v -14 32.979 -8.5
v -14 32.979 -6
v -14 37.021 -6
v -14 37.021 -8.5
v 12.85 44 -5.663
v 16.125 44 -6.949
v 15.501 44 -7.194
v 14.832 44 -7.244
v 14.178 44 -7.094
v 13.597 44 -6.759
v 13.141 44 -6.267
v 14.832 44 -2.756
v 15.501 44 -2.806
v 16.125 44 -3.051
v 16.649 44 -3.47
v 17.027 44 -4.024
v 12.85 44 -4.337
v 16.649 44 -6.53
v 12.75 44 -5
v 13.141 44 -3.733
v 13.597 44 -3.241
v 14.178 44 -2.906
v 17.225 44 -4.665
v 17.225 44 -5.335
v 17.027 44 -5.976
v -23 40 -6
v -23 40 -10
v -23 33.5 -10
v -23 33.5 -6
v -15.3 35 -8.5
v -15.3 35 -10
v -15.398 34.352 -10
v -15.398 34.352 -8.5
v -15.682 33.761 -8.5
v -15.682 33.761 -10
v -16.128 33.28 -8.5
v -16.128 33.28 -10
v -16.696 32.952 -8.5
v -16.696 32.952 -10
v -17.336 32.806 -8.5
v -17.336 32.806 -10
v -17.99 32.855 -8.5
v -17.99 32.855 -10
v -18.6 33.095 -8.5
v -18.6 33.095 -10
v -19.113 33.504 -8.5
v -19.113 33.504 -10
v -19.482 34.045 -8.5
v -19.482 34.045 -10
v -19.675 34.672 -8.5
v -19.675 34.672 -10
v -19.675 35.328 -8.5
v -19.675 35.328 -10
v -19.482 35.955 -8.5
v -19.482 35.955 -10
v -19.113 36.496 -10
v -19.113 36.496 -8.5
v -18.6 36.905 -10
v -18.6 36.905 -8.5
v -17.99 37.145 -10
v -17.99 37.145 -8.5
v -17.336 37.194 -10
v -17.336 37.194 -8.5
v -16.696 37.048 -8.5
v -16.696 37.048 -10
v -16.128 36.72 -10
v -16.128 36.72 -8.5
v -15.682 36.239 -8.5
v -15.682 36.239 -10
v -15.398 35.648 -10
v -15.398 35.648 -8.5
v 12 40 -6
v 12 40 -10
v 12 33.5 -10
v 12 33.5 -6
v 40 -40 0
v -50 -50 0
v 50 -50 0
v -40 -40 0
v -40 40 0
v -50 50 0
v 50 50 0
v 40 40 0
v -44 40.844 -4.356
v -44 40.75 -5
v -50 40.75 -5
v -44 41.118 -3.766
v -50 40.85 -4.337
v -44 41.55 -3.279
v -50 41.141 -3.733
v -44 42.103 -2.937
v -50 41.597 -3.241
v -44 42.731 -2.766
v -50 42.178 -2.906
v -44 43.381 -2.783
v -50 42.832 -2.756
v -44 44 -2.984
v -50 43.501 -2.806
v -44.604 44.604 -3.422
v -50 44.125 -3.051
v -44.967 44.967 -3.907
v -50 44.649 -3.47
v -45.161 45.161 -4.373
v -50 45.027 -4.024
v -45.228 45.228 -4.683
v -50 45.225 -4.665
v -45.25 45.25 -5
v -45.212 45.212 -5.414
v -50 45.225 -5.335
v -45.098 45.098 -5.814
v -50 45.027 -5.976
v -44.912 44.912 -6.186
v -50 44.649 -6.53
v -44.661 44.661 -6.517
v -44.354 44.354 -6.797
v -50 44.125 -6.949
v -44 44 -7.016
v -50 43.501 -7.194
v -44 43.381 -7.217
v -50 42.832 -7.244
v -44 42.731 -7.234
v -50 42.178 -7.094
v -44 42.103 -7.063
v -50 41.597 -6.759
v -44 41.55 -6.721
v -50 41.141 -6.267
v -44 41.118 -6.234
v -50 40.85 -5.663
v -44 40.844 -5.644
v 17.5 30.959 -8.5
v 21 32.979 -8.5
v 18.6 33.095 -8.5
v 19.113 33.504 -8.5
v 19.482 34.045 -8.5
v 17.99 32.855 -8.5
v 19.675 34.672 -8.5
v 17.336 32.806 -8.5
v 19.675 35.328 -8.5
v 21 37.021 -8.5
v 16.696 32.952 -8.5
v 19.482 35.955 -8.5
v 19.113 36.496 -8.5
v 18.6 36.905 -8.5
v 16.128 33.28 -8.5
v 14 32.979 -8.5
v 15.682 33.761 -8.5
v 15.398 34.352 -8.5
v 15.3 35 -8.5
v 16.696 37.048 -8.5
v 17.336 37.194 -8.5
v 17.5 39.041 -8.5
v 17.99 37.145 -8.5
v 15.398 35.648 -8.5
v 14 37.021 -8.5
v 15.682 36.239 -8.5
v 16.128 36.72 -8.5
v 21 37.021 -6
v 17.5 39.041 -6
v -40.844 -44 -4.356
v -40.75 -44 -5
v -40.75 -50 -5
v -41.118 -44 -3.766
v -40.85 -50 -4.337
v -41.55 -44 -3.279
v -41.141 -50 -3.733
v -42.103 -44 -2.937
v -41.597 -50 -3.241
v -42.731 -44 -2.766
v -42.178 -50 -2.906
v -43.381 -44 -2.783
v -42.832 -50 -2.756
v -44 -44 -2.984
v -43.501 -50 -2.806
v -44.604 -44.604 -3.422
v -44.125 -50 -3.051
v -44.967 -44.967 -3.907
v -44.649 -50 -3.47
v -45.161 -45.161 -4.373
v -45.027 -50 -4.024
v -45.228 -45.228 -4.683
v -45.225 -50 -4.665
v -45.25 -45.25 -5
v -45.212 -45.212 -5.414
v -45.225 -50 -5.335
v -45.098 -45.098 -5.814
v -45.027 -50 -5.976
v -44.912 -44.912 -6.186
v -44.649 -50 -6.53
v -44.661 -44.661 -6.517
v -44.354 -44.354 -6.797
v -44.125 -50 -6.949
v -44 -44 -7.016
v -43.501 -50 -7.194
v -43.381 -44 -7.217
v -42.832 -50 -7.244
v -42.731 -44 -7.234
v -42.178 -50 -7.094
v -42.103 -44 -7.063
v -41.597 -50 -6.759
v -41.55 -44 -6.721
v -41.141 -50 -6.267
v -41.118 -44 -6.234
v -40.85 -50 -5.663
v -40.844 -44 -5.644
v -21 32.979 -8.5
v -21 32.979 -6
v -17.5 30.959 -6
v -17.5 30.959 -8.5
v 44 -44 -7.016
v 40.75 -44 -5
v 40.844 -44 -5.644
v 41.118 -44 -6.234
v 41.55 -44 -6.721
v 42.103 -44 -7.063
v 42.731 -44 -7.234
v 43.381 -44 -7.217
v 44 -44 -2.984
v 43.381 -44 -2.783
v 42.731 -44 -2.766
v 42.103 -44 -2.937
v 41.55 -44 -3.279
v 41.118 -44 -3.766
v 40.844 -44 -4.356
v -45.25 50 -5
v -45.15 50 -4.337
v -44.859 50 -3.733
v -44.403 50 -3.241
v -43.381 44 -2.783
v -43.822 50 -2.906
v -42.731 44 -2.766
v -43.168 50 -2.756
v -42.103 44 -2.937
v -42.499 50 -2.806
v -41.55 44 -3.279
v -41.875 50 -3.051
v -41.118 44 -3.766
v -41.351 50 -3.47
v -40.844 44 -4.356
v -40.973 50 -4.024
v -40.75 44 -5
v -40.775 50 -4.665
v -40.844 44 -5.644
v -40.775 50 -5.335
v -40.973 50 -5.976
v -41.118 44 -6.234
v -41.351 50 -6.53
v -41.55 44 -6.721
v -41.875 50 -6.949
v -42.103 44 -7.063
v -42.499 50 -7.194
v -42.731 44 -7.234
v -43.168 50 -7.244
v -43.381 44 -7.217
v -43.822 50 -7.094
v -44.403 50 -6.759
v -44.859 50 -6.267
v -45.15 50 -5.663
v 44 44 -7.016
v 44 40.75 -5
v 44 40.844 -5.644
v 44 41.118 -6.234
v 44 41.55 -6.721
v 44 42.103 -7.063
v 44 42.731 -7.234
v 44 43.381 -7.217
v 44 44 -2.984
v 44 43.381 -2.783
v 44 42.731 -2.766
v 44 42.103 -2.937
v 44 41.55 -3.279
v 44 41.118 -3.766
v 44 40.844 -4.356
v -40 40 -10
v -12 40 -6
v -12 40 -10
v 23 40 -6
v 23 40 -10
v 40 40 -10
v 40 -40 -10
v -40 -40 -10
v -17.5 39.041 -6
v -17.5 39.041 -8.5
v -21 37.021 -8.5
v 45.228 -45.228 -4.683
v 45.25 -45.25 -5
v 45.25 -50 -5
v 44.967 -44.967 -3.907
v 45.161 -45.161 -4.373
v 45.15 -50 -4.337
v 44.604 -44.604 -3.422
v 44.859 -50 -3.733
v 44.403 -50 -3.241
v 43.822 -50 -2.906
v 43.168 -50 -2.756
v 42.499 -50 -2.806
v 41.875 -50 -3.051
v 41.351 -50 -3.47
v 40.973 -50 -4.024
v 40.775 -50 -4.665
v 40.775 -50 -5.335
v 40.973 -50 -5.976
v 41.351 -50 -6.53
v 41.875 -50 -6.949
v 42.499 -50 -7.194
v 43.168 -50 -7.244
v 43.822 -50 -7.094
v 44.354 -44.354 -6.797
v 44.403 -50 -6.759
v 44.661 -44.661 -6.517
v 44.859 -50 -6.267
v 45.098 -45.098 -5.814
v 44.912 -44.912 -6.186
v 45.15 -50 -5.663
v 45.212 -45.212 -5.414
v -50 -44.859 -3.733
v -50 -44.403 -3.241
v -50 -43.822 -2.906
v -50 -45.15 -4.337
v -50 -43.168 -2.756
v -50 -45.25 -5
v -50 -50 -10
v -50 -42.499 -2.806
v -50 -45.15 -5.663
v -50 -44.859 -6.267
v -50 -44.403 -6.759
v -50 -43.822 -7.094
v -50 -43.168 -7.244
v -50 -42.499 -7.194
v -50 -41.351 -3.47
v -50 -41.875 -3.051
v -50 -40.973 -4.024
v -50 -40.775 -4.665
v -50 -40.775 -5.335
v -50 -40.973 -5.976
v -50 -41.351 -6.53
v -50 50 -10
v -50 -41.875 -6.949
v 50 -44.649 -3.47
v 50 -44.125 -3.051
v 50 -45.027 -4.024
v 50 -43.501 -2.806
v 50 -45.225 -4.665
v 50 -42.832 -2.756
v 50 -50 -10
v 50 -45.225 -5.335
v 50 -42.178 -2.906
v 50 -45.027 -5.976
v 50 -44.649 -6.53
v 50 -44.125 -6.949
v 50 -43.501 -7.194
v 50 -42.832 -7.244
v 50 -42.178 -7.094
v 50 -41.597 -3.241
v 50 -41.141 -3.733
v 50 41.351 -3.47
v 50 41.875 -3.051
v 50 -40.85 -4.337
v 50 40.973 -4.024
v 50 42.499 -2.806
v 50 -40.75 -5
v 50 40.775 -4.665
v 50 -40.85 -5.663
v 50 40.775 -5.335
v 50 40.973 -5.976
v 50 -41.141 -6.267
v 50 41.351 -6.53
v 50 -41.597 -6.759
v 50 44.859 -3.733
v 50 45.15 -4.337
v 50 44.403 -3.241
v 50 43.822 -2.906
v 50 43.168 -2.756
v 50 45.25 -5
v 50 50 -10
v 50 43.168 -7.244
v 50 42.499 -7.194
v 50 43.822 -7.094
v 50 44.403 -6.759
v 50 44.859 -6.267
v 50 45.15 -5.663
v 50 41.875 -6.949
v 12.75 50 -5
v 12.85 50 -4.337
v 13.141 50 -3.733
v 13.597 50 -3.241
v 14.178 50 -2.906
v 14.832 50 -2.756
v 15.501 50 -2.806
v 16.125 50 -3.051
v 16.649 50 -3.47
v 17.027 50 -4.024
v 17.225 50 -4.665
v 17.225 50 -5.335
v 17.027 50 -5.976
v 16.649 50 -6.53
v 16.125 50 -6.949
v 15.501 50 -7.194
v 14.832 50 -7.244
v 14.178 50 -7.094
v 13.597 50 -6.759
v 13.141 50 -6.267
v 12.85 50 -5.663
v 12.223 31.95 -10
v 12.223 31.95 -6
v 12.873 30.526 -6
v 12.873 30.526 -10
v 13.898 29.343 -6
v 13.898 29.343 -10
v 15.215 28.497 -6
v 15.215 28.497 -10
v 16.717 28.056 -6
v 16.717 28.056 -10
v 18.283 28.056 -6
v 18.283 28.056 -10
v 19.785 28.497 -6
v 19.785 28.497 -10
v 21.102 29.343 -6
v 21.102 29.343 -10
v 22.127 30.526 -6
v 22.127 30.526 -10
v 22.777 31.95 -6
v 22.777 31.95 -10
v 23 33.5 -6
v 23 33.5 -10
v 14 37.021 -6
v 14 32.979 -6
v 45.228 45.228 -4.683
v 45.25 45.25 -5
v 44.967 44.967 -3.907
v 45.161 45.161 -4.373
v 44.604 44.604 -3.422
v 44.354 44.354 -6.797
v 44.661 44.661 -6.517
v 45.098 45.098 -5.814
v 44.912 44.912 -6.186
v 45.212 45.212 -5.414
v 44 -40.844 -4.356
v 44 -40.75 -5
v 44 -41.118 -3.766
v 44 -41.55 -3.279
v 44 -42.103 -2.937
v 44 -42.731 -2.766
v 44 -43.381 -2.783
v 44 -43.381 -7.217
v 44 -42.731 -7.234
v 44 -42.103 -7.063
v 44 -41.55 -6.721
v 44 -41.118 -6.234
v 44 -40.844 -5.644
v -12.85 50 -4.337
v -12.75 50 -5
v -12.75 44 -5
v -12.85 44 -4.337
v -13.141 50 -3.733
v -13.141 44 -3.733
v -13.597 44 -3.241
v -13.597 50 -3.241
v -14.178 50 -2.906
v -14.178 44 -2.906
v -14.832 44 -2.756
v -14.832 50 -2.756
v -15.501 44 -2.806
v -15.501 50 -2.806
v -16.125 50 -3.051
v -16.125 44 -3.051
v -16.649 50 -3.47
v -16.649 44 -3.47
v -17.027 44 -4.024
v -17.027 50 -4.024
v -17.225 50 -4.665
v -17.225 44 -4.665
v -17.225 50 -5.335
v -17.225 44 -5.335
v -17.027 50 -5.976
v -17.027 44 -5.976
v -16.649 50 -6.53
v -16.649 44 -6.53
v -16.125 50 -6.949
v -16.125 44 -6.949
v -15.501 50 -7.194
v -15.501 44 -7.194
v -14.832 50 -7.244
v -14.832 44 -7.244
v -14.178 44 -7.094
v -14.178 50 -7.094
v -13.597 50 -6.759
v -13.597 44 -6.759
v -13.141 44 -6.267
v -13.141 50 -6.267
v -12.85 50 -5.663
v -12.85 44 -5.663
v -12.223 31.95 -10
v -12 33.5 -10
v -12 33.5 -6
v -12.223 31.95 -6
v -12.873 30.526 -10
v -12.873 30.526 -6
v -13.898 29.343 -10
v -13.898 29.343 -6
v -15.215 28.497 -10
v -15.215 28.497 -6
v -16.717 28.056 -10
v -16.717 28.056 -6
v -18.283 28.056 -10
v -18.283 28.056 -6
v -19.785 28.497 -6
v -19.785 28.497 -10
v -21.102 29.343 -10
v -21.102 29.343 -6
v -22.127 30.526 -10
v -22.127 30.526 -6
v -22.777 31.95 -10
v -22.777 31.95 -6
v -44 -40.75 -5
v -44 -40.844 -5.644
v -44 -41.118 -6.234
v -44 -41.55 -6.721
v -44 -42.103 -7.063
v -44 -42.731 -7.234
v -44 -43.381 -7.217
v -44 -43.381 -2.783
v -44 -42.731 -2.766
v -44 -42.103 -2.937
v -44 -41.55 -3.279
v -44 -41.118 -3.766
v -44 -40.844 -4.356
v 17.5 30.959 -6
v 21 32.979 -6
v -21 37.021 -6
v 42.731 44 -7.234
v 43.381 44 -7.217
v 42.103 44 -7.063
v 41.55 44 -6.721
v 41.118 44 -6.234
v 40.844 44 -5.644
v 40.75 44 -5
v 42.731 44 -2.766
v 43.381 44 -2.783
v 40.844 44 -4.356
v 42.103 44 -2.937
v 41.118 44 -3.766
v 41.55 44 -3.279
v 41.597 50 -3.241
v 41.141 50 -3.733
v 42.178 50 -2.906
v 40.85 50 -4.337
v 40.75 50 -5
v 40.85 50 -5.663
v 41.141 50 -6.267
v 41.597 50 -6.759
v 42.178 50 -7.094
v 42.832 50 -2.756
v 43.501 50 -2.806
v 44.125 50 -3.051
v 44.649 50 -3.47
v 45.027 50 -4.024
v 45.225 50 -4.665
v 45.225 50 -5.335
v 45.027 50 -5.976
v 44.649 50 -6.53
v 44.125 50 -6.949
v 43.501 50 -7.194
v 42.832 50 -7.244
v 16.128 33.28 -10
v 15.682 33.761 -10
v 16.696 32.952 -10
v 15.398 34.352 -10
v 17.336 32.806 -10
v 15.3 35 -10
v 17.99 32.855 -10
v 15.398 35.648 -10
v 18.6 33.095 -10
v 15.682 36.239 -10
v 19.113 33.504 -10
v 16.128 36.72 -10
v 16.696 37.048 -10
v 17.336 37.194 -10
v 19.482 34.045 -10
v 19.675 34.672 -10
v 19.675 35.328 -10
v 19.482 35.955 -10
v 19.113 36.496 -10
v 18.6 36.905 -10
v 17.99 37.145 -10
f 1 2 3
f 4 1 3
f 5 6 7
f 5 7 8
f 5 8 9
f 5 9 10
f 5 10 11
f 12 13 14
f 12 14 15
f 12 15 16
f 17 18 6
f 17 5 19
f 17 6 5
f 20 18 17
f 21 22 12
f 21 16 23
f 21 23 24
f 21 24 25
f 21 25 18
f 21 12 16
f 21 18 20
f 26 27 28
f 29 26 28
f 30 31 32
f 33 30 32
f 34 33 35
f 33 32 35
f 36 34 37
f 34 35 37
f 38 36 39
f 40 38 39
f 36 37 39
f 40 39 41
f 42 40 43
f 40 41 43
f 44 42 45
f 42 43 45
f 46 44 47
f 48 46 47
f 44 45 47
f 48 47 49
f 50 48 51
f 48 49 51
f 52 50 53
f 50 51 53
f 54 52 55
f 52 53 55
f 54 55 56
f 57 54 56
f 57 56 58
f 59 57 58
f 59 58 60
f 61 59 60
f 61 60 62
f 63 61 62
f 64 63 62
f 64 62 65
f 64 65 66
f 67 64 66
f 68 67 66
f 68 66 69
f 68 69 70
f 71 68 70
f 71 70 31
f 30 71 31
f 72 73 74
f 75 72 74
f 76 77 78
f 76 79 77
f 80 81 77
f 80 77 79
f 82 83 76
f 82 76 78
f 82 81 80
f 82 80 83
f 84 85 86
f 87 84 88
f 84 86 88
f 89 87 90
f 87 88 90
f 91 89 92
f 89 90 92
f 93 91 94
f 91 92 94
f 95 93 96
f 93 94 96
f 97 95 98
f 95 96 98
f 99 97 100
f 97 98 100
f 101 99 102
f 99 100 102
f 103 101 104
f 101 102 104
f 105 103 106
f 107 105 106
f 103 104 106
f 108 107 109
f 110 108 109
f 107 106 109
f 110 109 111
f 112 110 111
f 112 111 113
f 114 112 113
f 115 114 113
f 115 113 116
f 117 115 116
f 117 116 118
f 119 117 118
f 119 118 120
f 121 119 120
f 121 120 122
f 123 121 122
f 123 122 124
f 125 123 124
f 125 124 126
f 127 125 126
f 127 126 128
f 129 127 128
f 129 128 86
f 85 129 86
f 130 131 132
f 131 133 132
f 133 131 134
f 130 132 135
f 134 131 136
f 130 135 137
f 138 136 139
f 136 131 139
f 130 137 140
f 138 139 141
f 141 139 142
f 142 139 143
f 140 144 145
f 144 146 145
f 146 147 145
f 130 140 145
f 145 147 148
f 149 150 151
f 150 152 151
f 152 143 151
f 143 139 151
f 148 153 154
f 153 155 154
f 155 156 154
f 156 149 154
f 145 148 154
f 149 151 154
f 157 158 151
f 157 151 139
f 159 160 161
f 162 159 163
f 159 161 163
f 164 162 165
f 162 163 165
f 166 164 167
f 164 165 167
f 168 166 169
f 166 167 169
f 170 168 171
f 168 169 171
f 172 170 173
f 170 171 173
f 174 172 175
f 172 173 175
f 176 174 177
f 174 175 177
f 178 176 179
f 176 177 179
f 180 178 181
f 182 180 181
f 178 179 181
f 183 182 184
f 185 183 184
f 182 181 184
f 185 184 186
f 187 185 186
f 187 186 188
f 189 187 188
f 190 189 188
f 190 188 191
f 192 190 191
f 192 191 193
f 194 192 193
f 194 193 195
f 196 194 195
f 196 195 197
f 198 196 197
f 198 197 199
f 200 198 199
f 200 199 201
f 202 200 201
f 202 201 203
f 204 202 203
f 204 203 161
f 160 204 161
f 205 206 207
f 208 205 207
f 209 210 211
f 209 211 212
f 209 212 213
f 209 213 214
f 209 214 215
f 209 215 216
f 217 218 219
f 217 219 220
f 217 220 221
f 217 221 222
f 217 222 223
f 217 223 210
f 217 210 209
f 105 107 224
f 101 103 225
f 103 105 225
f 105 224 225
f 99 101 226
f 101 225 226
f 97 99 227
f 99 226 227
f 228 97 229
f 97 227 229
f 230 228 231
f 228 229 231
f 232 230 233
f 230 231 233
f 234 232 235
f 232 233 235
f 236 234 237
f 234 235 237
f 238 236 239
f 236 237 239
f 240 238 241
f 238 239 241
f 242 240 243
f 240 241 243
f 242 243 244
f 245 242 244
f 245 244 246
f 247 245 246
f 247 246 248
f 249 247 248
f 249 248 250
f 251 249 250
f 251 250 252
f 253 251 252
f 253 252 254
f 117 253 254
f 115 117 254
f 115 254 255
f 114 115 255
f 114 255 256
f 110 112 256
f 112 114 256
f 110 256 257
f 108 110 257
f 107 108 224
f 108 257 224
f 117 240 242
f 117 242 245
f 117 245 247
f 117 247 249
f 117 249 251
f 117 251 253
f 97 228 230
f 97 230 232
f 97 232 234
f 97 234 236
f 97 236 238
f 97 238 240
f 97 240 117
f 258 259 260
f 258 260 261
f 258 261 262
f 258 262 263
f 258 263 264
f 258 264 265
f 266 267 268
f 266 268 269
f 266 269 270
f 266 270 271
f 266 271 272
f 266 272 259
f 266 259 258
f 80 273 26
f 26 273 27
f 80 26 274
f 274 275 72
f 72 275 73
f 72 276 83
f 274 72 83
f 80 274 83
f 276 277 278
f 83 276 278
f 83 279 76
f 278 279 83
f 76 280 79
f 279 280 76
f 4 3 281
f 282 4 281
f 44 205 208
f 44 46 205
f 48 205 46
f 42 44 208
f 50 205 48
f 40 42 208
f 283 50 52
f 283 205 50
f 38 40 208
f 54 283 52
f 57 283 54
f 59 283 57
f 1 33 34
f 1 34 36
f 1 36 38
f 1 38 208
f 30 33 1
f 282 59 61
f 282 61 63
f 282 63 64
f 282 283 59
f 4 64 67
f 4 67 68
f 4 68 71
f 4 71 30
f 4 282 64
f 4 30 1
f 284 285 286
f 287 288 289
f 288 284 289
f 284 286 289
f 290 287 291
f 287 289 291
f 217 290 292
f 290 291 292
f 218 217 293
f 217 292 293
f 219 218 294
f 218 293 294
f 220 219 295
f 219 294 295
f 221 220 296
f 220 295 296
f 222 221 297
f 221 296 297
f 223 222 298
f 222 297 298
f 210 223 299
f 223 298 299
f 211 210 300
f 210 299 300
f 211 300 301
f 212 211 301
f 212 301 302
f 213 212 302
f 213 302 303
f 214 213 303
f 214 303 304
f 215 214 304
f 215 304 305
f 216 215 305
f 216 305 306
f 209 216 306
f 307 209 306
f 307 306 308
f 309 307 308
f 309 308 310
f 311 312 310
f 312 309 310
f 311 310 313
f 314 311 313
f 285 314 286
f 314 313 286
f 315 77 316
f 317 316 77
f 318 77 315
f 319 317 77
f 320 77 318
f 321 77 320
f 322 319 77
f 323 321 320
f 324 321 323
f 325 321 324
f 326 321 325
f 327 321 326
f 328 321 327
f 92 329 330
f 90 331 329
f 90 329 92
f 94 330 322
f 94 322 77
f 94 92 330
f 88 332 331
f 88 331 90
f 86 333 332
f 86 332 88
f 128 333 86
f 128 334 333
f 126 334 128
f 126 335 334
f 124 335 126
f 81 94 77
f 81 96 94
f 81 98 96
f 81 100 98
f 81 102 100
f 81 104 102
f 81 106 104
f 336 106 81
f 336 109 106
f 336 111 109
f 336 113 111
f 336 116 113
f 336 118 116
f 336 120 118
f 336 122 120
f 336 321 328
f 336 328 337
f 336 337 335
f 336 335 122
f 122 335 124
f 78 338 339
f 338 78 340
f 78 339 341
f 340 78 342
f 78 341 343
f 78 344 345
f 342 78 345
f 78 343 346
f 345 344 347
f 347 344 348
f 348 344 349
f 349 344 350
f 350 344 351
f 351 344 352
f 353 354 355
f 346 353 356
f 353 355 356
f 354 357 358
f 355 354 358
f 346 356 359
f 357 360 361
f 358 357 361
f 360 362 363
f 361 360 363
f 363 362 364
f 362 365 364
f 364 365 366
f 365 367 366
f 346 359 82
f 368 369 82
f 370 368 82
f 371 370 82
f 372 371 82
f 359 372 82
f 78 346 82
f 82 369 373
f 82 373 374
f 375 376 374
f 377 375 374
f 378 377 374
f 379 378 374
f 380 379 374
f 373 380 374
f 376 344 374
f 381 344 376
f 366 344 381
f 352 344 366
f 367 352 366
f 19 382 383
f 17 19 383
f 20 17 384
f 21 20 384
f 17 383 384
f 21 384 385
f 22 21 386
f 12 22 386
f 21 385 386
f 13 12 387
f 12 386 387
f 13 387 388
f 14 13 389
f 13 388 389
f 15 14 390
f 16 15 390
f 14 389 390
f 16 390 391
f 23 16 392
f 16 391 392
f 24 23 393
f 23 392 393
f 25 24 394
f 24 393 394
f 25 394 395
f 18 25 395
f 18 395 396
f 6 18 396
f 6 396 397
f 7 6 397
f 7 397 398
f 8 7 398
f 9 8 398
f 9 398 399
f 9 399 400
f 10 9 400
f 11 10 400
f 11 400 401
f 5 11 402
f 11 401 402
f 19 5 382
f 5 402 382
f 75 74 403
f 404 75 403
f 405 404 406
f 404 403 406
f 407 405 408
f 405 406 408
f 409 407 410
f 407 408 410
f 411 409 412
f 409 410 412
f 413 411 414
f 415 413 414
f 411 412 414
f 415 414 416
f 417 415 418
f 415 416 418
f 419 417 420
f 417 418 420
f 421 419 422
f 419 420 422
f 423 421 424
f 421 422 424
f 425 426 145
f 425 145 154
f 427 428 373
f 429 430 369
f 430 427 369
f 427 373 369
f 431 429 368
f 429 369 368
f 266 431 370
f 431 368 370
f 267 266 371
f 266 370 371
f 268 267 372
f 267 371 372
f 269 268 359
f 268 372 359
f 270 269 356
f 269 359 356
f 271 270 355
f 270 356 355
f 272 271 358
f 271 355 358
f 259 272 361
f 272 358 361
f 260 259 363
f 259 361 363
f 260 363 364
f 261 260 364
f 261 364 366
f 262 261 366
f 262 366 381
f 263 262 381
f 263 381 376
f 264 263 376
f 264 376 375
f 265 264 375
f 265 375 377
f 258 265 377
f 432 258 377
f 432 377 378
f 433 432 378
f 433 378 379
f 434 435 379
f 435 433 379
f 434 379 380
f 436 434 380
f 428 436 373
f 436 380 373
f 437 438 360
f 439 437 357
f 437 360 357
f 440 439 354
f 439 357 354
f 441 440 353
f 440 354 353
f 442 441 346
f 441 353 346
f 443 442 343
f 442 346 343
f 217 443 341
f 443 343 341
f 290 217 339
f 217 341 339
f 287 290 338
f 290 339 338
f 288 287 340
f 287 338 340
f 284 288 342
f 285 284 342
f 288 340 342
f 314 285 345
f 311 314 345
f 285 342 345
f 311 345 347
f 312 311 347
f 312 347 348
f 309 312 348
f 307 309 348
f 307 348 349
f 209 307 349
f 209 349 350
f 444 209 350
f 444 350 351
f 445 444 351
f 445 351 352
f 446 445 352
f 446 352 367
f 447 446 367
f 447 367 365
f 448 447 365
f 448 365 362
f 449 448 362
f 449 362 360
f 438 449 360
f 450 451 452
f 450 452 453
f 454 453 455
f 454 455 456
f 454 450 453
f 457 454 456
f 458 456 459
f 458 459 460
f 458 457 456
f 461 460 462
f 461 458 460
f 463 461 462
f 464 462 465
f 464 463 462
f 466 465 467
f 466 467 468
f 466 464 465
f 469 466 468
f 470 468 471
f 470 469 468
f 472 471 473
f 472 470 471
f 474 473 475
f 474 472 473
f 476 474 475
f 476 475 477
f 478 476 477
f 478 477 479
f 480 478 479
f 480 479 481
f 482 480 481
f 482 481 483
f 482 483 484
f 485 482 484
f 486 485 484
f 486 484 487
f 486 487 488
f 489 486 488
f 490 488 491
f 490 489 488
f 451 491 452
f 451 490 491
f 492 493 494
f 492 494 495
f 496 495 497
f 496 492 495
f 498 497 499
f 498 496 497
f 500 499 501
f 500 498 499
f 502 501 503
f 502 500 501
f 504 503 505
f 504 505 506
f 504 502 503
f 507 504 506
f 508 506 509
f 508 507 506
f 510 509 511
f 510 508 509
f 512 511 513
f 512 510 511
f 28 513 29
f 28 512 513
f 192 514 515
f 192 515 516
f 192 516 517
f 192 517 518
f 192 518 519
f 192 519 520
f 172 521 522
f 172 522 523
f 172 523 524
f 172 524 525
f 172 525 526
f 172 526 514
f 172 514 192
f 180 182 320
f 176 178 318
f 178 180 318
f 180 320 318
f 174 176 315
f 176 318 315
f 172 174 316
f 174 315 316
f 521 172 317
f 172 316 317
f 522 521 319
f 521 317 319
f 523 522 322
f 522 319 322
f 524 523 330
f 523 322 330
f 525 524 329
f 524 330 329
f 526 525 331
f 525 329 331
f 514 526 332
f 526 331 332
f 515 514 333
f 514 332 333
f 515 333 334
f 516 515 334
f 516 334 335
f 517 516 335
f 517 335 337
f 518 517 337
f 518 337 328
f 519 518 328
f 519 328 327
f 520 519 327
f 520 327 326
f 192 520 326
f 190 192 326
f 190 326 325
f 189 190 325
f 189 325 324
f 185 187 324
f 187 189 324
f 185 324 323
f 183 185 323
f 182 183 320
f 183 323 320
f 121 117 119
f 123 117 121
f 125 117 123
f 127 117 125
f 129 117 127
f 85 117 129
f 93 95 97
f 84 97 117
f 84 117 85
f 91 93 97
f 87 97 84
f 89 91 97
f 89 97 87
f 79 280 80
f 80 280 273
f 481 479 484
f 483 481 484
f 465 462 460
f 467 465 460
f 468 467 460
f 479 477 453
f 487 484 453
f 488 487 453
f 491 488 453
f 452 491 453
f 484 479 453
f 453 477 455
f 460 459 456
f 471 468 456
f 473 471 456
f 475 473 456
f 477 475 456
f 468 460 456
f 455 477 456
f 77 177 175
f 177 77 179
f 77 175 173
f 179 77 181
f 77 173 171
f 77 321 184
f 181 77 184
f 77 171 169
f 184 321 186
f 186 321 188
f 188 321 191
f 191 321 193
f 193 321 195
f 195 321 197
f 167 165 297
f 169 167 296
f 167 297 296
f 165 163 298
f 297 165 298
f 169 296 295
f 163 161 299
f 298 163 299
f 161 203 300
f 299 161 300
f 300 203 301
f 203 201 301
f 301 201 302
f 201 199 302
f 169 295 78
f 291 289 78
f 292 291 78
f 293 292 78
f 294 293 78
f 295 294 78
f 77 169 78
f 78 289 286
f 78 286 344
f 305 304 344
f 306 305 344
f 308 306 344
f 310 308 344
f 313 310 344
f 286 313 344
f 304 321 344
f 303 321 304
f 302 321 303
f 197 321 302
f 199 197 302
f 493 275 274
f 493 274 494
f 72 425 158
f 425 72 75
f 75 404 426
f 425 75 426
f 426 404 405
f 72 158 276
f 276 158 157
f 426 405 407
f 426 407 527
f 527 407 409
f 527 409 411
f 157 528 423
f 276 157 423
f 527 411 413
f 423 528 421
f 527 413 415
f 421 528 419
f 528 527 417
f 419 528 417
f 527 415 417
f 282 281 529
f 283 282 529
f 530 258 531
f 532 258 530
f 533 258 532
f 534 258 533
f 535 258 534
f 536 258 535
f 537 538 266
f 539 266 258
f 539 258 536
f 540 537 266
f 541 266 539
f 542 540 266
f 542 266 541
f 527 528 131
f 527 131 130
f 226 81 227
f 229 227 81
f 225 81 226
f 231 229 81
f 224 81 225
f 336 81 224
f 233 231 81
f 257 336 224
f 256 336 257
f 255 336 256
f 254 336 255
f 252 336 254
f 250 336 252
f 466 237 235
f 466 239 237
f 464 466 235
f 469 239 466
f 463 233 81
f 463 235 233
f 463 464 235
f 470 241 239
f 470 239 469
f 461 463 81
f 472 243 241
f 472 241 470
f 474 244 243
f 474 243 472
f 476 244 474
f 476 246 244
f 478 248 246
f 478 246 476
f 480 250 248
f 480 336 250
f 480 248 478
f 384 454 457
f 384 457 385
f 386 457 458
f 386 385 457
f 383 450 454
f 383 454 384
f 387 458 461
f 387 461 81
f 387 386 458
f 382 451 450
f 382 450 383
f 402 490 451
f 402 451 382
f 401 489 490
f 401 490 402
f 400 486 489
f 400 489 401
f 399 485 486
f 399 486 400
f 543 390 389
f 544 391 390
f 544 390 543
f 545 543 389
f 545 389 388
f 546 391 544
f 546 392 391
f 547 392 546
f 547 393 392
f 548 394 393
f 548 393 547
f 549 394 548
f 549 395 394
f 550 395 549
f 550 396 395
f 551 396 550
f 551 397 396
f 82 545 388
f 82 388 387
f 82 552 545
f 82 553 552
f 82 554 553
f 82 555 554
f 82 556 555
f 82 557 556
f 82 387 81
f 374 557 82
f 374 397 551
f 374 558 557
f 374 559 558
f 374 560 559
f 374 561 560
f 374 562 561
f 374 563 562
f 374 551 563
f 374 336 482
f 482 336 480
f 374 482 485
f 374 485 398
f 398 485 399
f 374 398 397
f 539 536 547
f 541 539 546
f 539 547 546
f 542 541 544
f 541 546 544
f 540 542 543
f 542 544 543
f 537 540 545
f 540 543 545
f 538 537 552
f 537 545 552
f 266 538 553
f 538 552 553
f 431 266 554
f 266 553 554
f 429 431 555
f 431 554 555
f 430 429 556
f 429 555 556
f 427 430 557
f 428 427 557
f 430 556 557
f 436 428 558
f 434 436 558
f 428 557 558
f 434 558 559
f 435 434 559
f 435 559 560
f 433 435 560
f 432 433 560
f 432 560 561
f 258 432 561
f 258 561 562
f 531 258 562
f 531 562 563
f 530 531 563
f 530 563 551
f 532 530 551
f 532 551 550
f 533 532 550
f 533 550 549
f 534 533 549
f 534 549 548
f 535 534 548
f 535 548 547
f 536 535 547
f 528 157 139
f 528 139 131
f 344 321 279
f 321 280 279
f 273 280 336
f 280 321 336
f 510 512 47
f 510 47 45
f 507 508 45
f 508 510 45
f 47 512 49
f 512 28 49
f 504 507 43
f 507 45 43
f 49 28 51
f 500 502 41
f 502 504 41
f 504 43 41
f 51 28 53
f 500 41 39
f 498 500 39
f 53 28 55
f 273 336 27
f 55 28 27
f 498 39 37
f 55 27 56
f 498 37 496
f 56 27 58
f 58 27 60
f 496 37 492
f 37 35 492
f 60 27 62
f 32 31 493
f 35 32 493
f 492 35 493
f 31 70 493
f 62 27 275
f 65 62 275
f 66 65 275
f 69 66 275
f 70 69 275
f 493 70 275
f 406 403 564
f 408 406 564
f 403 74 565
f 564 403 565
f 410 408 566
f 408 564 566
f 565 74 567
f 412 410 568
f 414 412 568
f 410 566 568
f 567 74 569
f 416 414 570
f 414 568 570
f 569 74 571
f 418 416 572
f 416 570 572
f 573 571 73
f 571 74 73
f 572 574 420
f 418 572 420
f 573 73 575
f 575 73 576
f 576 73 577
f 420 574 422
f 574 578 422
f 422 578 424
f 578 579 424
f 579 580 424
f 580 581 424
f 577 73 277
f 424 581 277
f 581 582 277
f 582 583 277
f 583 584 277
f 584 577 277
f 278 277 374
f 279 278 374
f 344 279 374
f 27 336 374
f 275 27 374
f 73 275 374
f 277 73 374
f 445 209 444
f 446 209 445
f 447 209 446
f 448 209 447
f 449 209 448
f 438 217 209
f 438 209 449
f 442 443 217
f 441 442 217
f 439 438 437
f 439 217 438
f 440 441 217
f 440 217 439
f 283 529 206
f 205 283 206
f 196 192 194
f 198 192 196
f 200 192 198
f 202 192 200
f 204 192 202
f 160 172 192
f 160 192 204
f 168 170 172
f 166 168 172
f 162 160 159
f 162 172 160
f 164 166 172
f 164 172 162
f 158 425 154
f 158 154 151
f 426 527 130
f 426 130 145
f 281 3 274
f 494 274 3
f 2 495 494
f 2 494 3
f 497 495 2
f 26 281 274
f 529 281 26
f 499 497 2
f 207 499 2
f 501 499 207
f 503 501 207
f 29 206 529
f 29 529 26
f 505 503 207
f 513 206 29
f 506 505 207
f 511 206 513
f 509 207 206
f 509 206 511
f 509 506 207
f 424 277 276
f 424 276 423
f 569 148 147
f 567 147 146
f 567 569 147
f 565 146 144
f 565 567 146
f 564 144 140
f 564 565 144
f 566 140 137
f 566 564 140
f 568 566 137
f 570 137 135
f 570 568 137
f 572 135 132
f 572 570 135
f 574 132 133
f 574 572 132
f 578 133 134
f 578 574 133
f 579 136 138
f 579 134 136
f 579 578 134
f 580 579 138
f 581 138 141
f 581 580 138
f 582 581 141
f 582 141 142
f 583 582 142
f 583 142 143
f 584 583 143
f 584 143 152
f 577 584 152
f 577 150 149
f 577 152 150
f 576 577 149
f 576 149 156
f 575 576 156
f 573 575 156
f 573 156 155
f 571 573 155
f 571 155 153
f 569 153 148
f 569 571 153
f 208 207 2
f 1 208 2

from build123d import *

# Parameters (mm, degrees)
SKETCH081_W           = 100
SKETCH081_H           = 100
SKETCH081_W_2         = 80
SKETCH081_H_2         = 80
PAD032_DEPTH          = 10
SKETCH083_R           = 2.25
POCKET051_DEPTH       = 6
POLARPATTERN002_COUNT = 4
SKETCH082_R           = 2.25
POCKET050_DEPTH       = 6
POLARPATTERN003_COUNT = 4
SKETCH084_R           = 2.25
POCKET049_DEPTH       = 6
SKETCH098_R           = 2.2
PAD037_DEPTH          = 4
POCKET061_DEPTH       = 2.5


with BuildPart() as part:
    # Sketch081 → Pad032 (new body)
    with BuildSketch(Plane.XY):
        Rectangle(SKETCH081_W, SKETCH081_H)
        Rectangle(SKETCH081_W_2, SKETCH081_H_2, mode=Mode.SUBTRACT)
    extrude(amount=PAD032_DEPTH)

    # Sketch083 → Pocket051 (cut)
    with BuildSketch(Plane.XZ.offset(50)):
        with Locations((-43, 5)):
            Circle(SKETCH083_R)
    pocket051 = extrude(amount=-POCKET051_DEPTH, mode=Mode.SUBTRACT)

    # PolarPattern002: Pocket051 ×4 about axis
    polarpattern002_axis = Axis((0, 0, 0), (0, 0, 1))
    for i in range(1, POLARPATTERN002_COUNT):
        add(pocket051.rotate(polarpattern002_axis, i * 360 / POLARPATTERN002_COUNT), mode=Mode.SUBTRACT)

    # Sketch082 (on Face2 of PolarPattern002) → Pocket050 (cut)
    with BuildSketch(Plane(origin=(-50, 0, 0), x_dir=(0, -1, 0), z_dir=(-1, 0, 0))):
        with Locations((43, 5)):
            Circle(SKETCH082_R)
    pocket050 = extrude(amount=-POCKET050_DEPTH, mode=Mode.SUBTRACT)

    # PolarPattern003: Pocket050 ×4 about axis
    polarpattern003_axis = Axis((0, 0, 0), (0, 0, 1))
    for i in range(1, POLARPATTERN003_COUNT):
        add(pocket050.rotate(polarpattern003_axis, i * 360 / POLARPATTERN003_COUNT), mode=Mode.SUBTRACT)

    # Sketch084 (on Face1 of PolarPattern003) → Pocket049 (cut)
    with BuildSketch(Plane(origin=(0, 50, 0), x_dir=(-1, 0, 0), z_dir=(0, 1, 0))):
        with Locations((-15, 5)):
            Circle(SKETCH084_R)
    pocket049 = extrude(amount=-POCKET049_DEPTH, mode=Mode.SUBTRACT)

    # Mirrored003: Pocket049 across Sketch084 V_Axis
    add(pocket049.mirror(Plane(origin=(0, 50, 0), x_dir=(0, 1, 0), z_dir=(-1, 0, 0))), mode=Mode.SUBTRACT)

    # Sketch098 (on Face3 of Mirrored003) → Pad037 (join)
    with BuildSketch(Plane(origin=(0, 0, 0), x_dir=(1, 0, 0), z_dir=(0, 0, -1))):
        with BuildLine():
            Line((-23, -40), (-23, -33.5))
            ThreePointArc((-12, -33.5), (-17.5, -28), (-23, -33.5))
            Line((-12, -40), (-12, -33.5))
            Line((-23, -40), (-12, -40))
        make_face()
        with Locations((-17.5, -35)):
            Circle(SKETCH098_R, mode=Mode.SUBTRACT)
    pad037 = extrude(amount=-PAD037_DEPTH)

    # Sketch099 (on Face29 of Pad037) → Pocket061 (cut)
    with BuildSketch(Plane.XY.offset(4)):
        Polygon((-14, 37.020726), (-17.5, 39.041452), (-21, 37.020726), (-21, 32.979274), (-17.5, 30.958548), (-14, 32.979274), align=None)
    pocket061 = extrude(amount=-POCKET061_DEPTH, mode=Mode.SUBTRACT)

    # Mirrored006: Pad037, Pocket061 across Sketch098 V_Axis
    add(pad037.mirror(Plane(origin=(0, 0, 0), x_dir=(0, 0, -1), z_dir=(1, 0, 0))))
    add(pocket061.mirror(Plane(origin=(0, 0, 0), x_dir=(0, 0, -1), z_dir=(1, 0, 0))), mode=Mode.SUBTRACT)


with BuildPart() as part_1:
    # Body011 placement: moved
    add(part.part.moved(Location((0, 0, -10))))


solid = part_1.part
